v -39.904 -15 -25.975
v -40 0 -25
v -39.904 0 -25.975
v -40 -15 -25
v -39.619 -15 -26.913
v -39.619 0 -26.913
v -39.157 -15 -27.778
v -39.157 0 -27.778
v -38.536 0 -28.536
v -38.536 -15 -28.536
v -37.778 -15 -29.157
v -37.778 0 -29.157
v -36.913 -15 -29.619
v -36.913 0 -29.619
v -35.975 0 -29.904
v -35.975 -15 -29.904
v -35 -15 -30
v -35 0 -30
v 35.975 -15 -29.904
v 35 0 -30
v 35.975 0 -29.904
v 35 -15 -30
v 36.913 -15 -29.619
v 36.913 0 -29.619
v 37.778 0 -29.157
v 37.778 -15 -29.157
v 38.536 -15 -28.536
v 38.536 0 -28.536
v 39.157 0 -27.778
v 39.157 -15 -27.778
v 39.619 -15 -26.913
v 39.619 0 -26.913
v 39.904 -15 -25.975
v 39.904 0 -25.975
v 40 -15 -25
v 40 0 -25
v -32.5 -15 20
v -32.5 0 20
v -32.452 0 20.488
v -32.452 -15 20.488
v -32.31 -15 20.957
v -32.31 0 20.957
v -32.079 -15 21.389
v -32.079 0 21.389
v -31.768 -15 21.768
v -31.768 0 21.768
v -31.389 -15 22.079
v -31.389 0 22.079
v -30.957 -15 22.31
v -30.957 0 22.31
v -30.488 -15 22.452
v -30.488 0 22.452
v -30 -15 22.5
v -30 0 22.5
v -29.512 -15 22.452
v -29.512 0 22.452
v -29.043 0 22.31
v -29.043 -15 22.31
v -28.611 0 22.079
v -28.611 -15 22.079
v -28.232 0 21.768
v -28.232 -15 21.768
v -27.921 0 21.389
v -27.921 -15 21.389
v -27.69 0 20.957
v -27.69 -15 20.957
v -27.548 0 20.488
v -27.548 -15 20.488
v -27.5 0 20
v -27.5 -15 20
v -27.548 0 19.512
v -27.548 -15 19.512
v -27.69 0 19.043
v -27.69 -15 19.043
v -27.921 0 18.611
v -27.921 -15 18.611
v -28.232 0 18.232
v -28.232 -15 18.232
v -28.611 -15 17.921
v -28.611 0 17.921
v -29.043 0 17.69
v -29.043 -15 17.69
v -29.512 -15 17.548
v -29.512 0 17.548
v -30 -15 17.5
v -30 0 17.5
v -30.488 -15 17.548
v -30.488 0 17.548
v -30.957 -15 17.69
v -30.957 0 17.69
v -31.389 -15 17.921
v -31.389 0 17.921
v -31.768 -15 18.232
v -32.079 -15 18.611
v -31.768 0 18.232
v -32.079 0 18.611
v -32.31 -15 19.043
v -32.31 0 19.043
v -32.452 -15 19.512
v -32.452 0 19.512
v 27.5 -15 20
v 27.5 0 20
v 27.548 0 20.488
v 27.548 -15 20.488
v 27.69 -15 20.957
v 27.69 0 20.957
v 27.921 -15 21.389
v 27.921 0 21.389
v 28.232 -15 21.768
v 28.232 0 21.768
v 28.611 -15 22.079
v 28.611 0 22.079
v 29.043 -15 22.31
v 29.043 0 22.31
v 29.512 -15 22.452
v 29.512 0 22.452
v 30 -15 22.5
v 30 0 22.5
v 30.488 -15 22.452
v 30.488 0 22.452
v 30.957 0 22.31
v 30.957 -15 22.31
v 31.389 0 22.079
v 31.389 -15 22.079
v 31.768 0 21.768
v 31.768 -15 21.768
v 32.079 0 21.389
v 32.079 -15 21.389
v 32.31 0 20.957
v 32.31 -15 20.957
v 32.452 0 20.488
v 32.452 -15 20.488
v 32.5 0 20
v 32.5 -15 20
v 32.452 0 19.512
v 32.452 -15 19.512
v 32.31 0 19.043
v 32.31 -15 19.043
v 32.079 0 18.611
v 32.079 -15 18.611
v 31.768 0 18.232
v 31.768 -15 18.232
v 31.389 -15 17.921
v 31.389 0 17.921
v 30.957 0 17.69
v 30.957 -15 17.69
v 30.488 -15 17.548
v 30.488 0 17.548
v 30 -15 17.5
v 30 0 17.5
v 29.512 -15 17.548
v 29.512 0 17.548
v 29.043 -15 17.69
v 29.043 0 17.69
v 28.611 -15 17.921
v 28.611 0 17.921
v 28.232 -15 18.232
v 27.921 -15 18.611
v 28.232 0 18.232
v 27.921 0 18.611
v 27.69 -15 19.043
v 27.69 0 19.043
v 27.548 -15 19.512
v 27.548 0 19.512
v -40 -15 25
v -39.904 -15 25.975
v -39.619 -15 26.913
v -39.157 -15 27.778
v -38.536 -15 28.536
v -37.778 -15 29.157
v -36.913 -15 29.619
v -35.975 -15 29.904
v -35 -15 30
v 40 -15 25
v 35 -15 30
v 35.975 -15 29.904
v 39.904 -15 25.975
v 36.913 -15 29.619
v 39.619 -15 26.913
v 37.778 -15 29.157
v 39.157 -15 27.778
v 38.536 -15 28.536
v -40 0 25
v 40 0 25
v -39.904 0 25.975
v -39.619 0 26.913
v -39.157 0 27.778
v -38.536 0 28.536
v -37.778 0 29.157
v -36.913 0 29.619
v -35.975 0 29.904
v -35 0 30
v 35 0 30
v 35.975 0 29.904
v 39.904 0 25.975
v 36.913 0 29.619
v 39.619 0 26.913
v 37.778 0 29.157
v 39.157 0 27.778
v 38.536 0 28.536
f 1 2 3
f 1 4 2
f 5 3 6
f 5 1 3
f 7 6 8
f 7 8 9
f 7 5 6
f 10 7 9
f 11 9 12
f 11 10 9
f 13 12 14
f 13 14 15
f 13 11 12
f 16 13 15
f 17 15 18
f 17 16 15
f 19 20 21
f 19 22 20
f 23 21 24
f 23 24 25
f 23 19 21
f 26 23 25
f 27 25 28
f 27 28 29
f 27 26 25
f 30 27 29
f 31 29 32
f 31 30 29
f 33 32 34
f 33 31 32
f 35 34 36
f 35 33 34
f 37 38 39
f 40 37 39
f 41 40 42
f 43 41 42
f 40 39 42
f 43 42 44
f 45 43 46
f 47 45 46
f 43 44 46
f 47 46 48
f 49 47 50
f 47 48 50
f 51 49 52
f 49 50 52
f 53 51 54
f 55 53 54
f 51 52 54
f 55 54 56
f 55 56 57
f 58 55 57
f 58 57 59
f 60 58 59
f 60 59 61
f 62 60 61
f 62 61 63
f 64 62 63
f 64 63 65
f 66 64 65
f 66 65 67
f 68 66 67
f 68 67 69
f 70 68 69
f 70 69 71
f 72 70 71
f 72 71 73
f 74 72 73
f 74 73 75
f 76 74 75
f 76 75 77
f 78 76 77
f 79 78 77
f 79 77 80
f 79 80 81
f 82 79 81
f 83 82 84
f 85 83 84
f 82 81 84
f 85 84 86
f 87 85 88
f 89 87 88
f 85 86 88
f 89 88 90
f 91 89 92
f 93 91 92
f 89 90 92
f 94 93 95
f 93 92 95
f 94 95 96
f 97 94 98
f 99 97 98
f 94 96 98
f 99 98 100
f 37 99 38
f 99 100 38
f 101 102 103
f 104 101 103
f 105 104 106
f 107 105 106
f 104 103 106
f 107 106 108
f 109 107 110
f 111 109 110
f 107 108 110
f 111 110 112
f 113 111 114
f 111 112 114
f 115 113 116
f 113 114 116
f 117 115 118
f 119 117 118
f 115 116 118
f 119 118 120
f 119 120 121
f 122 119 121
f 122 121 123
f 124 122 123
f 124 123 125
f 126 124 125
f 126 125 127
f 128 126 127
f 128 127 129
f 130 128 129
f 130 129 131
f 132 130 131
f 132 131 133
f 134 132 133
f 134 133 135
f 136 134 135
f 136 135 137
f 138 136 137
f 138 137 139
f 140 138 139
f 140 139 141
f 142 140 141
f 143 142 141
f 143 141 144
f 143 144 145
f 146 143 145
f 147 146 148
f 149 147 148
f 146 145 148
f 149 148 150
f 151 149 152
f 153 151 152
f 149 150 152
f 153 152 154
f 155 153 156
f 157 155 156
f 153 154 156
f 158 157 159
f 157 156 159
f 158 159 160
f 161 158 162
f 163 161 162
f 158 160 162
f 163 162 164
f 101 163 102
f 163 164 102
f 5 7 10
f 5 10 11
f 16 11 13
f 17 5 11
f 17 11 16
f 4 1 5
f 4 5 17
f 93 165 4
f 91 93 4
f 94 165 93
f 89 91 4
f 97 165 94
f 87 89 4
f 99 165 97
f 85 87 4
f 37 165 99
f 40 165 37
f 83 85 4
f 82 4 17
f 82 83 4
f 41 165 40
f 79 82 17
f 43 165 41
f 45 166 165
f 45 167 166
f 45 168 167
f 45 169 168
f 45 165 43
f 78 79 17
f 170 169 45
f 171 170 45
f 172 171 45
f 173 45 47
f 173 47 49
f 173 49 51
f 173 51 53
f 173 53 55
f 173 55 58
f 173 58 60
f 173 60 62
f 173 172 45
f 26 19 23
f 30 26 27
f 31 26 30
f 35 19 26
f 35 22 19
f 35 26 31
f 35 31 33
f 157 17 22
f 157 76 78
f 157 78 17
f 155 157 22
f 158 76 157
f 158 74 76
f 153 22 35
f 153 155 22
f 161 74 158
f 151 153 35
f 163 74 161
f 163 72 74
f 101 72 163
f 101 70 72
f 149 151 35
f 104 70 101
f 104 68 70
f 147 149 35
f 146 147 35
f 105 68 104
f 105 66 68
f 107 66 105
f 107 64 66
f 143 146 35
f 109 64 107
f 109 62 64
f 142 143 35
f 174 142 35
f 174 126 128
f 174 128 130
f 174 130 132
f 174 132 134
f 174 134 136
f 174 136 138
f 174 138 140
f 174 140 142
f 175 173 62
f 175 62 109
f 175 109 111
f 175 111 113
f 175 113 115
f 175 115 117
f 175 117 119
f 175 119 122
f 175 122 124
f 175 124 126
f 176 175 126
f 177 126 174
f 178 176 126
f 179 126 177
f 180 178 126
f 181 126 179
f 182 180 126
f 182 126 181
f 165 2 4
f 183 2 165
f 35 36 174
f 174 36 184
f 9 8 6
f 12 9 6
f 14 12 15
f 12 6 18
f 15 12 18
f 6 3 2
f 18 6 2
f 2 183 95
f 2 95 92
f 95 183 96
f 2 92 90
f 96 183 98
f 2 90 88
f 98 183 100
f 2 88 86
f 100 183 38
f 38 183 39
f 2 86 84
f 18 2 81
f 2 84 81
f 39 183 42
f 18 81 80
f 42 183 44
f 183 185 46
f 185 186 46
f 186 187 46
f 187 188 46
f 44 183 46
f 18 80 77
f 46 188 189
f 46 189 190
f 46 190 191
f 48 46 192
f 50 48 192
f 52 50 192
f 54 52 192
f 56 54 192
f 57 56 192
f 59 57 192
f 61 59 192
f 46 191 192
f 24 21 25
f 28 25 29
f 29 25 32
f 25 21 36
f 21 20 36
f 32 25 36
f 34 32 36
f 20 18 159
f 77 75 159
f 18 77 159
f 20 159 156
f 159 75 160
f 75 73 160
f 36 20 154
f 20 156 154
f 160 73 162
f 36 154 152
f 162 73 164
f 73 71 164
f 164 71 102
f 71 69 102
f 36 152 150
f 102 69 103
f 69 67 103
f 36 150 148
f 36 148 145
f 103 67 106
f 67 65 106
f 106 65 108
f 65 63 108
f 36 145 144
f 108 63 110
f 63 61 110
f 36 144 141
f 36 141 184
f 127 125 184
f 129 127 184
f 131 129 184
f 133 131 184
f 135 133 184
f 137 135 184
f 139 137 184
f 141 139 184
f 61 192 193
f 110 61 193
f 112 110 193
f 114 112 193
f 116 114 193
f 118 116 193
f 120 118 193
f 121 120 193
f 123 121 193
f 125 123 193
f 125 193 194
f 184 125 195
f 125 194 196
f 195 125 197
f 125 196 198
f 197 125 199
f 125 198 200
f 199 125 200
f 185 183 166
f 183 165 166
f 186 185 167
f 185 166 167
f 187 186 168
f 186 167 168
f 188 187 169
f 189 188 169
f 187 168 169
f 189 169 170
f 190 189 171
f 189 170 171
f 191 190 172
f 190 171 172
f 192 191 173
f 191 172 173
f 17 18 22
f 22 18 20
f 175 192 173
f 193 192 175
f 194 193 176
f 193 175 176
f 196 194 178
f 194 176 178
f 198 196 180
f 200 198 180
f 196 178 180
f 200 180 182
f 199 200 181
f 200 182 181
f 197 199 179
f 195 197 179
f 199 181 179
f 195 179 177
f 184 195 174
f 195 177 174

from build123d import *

# Parameters (mm, degrees)
F0_W     = 80
F0_H     = 60
F1_DEPTH = 15
F3_D     = 5
F4_R     = 5


with BuildPart() as f1:
    # F0 (on Front) → F1 (new body)
    with BuildSketch(Plane.XZ):
        Rectangle(F0_W, F0_H)
    extrude(amount=F1_DEPTH)

    # F3 (through all)
    with Locations(Plane.XZ.offset(15)):
        with Locations((-30, 20), (30, 20)):
            Hole(F3_D / 2)

    # F4
    f4_edges = [f1.edges().sort_by_distance(p)[0] for p in [
        (40, -7.5, 30),
        (-40, -7.5, 30),
        (-40, -7.5, -30),
        (40, -7.5, -30),
    ]]
    fillet(f4_edges, radius=F4_R)


solid = f1.part
